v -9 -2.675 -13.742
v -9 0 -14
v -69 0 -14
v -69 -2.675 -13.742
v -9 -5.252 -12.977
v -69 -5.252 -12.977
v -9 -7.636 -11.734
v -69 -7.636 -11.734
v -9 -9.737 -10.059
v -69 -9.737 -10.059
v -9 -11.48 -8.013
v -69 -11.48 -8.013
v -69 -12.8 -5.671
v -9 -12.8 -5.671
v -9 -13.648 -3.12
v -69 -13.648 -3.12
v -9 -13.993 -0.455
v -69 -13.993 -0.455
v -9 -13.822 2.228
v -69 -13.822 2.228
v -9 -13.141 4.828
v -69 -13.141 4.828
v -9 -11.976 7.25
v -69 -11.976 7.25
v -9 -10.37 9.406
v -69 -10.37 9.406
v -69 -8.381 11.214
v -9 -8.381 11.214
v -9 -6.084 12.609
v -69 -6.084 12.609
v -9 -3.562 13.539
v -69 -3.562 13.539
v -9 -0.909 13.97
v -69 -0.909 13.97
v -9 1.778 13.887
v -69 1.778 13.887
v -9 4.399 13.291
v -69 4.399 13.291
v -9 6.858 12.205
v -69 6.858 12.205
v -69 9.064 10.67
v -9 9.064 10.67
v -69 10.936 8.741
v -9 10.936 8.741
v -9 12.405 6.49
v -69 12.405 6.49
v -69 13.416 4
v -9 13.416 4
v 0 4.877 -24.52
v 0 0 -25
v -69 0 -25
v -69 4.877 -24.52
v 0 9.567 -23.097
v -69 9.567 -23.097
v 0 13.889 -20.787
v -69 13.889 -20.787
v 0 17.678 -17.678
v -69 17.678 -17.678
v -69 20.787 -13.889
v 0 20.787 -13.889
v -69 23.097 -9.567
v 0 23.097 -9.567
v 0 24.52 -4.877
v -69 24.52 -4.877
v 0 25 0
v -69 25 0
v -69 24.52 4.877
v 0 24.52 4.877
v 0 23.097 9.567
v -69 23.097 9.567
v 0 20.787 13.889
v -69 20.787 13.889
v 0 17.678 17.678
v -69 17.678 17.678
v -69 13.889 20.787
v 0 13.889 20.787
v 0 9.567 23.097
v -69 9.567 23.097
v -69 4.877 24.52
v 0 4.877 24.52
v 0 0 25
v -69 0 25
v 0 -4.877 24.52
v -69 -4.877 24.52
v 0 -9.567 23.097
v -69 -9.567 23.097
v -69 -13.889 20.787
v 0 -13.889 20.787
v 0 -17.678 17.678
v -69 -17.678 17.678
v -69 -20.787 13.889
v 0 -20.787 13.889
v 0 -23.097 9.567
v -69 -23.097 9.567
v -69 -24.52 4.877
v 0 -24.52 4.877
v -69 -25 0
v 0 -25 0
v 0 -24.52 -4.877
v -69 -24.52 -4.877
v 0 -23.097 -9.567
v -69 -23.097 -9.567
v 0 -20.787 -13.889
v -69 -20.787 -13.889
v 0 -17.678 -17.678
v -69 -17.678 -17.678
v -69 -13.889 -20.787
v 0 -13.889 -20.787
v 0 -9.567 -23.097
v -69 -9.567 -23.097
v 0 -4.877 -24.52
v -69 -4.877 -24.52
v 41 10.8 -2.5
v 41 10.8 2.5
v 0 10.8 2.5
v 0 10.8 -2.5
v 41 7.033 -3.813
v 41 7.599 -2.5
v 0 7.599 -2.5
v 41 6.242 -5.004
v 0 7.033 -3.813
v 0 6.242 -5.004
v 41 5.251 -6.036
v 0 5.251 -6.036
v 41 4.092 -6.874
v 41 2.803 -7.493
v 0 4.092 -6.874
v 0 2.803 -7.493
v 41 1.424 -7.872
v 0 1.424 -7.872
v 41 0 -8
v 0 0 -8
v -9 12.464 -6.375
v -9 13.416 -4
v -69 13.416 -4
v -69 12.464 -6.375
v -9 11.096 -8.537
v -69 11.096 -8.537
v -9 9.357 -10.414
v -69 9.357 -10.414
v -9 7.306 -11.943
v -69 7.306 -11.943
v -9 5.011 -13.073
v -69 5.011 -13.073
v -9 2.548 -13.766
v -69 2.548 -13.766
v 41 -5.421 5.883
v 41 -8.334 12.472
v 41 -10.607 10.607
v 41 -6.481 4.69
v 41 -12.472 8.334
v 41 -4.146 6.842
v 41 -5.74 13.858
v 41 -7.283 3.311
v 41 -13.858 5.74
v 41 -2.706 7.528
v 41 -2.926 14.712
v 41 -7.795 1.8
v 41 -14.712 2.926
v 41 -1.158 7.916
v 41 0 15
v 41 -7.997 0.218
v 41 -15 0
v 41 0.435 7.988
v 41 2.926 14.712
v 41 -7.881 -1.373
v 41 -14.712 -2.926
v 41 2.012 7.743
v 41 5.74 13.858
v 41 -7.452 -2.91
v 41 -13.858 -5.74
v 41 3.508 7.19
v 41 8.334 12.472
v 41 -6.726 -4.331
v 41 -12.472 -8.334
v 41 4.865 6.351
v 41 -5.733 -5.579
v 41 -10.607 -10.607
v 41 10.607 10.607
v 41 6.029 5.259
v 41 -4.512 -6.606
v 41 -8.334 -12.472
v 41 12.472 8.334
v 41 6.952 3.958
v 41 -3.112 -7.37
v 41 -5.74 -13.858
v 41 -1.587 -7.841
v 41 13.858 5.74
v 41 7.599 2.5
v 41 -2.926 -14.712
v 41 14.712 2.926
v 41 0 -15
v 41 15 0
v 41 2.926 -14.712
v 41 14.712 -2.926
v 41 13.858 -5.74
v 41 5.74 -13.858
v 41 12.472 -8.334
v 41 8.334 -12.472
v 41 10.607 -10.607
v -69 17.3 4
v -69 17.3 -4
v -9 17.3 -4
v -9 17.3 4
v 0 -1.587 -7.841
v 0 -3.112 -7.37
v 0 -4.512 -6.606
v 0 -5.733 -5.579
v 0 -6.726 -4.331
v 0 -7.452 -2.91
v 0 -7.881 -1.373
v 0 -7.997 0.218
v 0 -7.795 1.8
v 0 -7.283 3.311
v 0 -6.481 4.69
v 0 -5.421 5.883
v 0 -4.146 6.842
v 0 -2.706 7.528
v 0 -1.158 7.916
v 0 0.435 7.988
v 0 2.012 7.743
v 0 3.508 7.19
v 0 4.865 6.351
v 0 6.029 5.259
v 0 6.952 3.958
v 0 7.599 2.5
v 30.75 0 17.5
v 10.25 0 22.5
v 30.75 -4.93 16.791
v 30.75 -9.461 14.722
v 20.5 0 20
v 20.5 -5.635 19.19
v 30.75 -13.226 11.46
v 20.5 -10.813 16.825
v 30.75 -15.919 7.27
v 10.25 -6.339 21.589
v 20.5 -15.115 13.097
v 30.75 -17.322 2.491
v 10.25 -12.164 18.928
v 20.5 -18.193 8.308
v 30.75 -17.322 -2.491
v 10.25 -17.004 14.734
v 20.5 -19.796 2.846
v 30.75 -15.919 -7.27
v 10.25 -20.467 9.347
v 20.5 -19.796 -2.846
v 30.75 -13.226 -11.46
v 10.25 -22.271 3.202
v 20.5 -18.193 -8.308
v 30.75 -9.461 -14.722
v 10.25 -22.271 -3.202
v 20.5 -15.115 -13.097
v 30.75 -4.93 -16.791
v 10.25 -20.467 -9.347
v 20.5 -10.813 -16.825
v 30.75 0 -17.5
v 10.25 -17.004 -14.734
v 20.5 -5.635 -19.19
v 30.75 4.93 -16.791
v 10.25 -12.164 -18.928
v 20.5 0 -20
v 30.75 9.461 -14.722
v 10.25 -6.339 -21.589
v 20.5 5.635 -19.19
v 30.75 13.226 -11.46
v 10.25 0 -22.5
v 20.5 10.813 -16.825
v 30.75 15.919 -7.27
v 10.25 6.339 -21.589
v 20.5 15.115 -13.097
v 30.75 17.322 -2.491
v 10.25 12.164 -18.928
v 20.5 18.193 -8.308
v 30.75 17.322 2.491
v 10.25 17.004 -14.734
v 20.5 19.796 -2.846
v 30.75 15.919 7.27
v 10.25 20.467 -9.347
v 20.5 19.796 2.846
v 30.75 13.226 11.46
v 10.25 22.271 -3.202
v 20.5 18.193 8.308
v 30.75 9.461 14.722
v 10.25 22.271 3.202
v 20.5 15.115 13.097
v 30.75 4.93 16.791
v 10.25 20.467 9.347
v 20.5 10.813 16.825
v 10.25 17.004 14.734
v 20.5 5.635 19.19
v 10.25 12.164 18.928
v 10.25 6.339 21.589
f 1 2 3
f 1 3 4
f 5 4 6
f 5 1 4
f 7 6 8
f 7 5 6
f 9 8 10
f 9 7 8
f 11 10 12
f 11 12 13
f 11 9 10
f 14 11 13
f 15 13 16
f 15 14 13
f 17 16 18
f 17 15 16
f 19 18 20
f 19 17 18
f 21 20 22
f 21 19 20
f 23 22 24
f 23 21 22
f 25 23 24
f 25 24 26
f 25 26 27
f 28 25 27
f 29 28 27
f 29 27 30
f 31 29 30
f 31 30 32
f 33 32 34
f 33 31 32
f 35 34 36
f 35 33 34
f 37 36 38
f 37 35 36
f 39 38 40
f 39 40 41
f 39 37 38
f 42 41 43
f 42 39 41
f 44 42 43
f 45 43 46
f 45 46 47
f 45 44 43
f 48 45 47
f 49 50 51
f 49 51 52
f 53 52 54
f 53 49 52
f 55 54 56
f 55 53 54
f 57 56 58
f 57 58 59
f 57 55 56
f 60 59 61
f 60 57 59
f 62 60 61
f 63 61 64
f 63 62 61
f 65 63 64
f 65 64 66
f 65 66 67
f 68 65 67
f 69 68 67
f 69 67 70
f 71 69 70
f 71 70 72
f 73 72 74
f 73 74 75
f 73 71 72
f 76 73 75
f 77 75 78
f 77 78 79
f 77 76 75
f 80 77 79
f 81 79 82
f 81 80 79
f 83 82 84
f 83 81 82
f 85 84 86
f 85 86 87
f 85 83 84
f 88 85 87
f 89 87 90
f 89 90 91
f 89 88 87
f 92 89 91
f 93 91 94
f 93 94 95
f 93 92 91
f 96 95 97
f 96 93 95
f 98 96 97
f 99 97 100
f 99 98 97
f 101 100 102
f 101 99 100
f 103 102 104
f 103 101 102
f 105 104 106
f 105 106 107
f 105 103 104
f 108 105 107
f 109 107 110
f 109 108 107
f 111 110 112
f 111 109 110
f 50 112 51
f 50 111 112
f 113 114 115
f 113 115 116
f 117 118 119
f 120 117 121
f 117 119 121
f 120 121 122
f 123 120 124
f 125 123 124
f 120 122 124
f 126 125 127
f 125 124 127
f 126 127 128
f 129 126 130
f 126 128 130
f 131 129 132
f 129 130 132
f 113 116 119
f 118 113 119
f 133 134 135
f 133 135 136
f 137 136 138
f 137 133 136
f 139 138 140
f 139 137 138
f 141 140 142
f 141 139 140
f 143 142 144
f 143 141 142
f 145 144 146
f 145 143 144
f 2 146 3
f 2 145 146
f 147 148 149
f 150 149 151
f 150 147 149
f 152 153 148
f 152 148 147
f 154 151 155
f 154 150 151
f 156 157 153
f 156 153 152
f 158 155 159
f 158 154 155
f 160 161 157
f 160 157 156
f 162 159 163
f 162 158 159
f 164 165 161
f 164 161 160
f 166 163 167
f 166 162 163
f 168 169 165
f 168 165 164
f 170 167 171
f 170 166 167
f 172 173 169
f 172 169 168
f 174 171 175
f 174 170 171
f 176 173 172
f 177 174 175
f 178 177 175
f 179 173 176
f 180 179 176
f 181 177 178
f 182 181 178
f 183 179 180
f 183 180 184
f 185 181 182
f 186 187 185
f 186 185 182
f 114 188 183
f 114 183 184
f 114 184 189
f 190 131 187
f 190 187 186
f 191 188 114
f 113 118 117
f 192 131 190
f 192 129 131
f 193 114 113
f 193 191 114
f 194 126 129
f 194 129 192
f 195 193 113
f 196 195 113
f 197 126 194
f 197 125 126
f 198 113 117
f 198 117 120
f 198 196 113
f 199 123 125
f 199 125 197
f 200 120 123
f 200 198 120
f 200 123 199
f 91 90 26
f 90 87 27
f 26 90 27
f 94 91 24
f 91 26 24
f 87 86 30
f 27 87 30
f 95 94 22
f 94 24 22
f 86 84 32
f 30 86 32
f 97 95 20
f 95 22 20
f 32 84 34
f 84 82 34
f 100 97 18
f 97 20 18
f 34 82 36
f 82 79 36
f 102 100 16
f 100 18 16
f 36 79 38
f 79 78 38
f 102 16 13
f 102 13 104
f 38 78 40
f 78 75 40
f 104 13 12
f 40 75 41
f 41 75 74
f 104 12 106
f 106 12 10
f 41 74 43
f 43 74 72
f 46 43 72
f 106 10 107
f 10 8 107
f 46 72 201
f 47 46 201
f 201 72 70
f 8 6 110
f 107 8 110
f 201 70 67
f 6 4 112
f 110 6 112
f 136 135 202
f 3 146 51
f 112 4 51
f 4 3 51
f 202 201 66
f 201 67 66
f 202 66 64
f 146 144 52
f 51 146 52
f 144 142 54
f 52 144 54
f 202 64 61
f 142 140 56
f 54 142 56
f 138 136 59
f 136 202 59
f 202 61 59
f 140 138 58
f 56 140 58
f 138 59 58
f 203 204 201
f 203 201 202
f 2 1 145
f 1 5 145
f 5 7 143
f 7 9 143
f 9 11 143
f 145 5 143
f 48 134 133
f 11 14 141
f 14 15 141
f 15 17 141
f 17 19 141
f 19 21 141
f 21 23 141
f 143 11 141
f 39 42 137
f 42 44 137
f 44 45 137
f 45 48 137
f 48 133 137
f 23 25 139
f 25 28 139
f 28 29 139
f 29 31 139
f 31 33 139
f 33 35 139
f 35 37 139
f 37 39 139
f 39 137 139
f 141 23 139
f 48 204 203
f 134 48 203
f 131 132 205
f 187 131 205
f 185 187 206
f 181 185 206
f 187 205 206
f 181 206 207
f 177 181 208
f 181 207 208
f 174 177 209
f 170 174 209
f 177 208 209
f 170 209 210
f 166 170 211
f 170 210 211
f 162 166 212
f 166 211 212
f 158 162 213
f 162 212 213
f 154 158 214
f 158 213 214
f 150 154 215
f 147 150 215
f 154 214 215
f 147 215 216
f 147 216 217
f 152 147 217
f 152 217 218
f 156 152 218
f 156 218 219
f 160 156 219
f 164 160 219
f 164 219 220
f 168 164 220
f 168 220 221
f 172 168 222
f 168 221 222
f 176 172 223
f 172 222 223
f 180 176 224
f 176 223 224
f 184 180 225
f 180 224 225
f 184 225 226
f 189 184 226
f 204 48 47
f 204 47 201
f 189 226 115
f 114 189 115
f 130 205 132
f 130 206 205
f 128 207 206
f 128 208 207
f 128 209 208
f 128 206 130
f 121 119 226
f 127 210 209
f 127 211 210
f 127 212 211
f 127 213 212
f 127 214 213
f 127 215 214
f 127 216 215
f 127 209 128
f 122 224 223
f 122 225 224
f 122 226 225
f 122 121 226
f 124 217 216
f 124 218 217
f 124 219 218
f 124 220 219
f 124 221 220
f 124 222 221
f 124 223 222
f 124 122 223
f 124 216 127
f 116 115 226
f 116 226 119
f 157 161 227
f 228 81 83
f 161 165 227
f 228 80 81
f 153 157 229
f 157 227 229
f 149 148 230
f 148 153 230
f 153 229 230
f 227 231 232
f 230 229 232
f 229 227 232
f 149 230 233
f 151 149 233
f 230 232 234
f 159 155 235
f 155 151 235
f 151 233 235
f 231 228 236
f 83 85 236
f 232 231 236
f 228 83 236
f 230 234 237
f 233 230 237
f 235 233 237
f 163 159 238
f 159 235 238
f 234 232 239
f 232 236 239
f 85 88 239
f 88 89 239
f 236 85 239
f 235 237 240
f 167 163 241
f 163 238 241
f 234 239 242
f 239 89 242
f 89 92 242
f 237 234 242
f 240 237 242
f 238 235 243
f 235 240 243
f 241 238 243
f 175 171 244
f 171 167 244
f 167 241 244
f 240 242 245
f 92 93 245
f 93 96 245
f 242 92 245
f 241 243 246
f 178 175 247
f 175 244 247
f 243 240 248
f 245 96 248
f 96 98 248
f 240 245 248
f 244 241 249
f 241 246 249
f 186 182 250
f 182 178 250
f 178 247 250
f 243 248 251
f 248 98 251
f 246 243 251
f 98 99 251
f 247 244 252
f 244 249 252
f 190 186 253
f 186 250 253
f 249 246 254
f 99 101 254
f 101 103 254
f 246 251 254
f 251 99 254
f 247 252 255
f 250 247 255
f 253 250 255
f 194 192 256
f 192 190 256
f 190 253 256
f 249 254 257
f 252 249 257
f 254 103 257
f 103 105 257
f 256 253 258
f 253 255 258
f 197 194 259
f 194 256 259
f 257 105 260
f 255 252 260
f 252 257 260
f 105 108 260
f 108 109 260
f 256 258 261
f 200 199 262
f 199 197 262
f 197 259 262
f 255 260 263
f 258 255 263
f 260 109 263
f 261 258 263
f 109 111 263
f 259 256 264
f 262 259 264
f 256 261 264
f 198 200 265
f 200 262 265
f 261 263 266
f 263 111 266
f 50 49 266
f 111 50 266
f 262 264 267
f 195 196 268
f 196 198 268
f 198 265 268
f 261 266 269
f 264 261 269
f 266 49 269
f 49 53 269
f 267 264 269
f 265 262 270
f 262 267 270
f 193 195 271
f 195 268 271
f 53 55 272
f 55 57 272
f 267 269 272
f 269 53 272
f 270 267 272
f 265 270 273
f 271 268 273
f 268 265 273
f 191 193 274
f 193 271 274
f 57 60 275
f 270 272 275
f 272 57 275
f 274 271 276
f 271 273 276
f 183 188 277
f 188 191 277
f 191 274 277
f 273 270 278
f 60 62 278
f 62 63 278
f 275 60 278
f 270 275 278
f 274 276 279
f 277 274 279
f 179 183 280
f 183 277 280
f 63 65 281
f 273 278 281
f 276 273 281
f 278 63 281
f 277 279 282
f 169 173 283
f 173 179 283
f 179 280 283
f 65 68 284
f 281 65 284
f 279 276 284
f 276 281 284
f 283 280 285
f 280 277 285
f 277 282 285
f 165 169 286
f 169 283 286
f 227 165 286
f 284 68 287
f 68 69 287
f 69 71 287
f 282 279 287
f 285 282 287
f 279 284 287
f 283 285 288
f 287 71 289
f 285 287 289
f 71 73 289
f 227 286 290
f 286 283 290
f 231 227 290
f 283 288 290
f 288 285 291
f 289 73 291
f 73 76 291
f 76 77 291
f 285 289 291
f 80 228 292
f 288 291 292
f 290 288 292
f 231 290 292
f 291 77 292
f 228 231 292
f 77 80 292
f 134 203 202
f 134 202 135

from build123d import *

# Parameters (mm, degrees)
SKETCH_2_R      = 15
EXTRUDE_2_DEPTH = 41
SKETCH_5_R      = 25
EXTRUDE_4_DEPTH = 9
EXTRUDE_START   = -9
SKETCH_6_R      = 25
EXTRUDE_5_DEPTH = 60


with BuildPart() as part:
    # Эскиз2 → Бобышка-Вытянуть2 (new body)
    with BuildSketch(Plane(origin=(0, 0, 0), x_dir=(0, 0, -1), z_dir=(1, 0, 0))):
        Circle(SKETCH_2_R)
        with BuildLine():
            Line((2.5, 10.8), (2.5, 7.599342077))
            ThreePointArc((2.5, 7.599342077), (6.480740698, 4.69041576), (8, 0))
            ThreePointArc((8, 0), (-4.69041576, -6.480740698), (-2.5, 7.599342077))
            Line((-2.5, 7.599342077), (-2.5, 10.8))
            Line((-2.5, 10.8), (0, 10.8))
            Line((0, 10.8), (2.5, 10.8))
        make_face(mode=Mode.SUBTRACT)
    extrude(amount=EXTRUDE_2_DEPTH)

    # Эскиз5 → Бобышка-Вытянуть4 (add)
    with BuildSketch(Plane(origin=(0, 0, 0), x_dir=(0, 0, -1), z_dir=(1, 0, 0))):
        Circle(SKETCH_5_R)
    extrude(amount=-EXTRUDE_4_DEPTH)

    # Эскиз6 → Бобышка-Вытянуть5 (add)
    with BuildSketch(Plane(origin=(0, 0, 0), x_dir=(0, 0, -1), z_dir=(1, 0, 0)).offset(EXTRUDE_START)):
        Circle(SKETCH_6_R)
        with BuildLine():
            ThreePointArc((14, 0), (-8.366600265, -11.22497216), (-4, 13.416407865))
            Line((-4, 13.416407865), (-4, 17.3))
            Line((-4, 17.3), (0, 17.3))
            Line((0, 17.3), (4, 17.3))
            Line((4, 17.3), (4, 13.416407865))
            ThreePointArc((4, 13.416407865), (11.22497216, 8.366600265), (14, 0))
        make_face(mode=Mode.SUBTRACT)
    extrude(amount=-EXTRUDE_5_DEPTH)

    # Эскиз7 → Повернуть1 (revolve)
    with BuildSketch(Plane(origin=(0, 0, 0), x_dir=(1, 0, 0), z_dir=(0, 1, 0)), mode=Mode.PRIVATE) as revolve_1_sk:
        Polygon((0, 25), (0, 15), (41, 15), align=None)
    revolve(revolve_1_sk.sketch.rotate(Axis((-60.197075593, 0, 0), (1, 0, 0)), 180), axis=Axis((-60.197075593, 0, 0), (1, 0, 0)))


solid = part.part
